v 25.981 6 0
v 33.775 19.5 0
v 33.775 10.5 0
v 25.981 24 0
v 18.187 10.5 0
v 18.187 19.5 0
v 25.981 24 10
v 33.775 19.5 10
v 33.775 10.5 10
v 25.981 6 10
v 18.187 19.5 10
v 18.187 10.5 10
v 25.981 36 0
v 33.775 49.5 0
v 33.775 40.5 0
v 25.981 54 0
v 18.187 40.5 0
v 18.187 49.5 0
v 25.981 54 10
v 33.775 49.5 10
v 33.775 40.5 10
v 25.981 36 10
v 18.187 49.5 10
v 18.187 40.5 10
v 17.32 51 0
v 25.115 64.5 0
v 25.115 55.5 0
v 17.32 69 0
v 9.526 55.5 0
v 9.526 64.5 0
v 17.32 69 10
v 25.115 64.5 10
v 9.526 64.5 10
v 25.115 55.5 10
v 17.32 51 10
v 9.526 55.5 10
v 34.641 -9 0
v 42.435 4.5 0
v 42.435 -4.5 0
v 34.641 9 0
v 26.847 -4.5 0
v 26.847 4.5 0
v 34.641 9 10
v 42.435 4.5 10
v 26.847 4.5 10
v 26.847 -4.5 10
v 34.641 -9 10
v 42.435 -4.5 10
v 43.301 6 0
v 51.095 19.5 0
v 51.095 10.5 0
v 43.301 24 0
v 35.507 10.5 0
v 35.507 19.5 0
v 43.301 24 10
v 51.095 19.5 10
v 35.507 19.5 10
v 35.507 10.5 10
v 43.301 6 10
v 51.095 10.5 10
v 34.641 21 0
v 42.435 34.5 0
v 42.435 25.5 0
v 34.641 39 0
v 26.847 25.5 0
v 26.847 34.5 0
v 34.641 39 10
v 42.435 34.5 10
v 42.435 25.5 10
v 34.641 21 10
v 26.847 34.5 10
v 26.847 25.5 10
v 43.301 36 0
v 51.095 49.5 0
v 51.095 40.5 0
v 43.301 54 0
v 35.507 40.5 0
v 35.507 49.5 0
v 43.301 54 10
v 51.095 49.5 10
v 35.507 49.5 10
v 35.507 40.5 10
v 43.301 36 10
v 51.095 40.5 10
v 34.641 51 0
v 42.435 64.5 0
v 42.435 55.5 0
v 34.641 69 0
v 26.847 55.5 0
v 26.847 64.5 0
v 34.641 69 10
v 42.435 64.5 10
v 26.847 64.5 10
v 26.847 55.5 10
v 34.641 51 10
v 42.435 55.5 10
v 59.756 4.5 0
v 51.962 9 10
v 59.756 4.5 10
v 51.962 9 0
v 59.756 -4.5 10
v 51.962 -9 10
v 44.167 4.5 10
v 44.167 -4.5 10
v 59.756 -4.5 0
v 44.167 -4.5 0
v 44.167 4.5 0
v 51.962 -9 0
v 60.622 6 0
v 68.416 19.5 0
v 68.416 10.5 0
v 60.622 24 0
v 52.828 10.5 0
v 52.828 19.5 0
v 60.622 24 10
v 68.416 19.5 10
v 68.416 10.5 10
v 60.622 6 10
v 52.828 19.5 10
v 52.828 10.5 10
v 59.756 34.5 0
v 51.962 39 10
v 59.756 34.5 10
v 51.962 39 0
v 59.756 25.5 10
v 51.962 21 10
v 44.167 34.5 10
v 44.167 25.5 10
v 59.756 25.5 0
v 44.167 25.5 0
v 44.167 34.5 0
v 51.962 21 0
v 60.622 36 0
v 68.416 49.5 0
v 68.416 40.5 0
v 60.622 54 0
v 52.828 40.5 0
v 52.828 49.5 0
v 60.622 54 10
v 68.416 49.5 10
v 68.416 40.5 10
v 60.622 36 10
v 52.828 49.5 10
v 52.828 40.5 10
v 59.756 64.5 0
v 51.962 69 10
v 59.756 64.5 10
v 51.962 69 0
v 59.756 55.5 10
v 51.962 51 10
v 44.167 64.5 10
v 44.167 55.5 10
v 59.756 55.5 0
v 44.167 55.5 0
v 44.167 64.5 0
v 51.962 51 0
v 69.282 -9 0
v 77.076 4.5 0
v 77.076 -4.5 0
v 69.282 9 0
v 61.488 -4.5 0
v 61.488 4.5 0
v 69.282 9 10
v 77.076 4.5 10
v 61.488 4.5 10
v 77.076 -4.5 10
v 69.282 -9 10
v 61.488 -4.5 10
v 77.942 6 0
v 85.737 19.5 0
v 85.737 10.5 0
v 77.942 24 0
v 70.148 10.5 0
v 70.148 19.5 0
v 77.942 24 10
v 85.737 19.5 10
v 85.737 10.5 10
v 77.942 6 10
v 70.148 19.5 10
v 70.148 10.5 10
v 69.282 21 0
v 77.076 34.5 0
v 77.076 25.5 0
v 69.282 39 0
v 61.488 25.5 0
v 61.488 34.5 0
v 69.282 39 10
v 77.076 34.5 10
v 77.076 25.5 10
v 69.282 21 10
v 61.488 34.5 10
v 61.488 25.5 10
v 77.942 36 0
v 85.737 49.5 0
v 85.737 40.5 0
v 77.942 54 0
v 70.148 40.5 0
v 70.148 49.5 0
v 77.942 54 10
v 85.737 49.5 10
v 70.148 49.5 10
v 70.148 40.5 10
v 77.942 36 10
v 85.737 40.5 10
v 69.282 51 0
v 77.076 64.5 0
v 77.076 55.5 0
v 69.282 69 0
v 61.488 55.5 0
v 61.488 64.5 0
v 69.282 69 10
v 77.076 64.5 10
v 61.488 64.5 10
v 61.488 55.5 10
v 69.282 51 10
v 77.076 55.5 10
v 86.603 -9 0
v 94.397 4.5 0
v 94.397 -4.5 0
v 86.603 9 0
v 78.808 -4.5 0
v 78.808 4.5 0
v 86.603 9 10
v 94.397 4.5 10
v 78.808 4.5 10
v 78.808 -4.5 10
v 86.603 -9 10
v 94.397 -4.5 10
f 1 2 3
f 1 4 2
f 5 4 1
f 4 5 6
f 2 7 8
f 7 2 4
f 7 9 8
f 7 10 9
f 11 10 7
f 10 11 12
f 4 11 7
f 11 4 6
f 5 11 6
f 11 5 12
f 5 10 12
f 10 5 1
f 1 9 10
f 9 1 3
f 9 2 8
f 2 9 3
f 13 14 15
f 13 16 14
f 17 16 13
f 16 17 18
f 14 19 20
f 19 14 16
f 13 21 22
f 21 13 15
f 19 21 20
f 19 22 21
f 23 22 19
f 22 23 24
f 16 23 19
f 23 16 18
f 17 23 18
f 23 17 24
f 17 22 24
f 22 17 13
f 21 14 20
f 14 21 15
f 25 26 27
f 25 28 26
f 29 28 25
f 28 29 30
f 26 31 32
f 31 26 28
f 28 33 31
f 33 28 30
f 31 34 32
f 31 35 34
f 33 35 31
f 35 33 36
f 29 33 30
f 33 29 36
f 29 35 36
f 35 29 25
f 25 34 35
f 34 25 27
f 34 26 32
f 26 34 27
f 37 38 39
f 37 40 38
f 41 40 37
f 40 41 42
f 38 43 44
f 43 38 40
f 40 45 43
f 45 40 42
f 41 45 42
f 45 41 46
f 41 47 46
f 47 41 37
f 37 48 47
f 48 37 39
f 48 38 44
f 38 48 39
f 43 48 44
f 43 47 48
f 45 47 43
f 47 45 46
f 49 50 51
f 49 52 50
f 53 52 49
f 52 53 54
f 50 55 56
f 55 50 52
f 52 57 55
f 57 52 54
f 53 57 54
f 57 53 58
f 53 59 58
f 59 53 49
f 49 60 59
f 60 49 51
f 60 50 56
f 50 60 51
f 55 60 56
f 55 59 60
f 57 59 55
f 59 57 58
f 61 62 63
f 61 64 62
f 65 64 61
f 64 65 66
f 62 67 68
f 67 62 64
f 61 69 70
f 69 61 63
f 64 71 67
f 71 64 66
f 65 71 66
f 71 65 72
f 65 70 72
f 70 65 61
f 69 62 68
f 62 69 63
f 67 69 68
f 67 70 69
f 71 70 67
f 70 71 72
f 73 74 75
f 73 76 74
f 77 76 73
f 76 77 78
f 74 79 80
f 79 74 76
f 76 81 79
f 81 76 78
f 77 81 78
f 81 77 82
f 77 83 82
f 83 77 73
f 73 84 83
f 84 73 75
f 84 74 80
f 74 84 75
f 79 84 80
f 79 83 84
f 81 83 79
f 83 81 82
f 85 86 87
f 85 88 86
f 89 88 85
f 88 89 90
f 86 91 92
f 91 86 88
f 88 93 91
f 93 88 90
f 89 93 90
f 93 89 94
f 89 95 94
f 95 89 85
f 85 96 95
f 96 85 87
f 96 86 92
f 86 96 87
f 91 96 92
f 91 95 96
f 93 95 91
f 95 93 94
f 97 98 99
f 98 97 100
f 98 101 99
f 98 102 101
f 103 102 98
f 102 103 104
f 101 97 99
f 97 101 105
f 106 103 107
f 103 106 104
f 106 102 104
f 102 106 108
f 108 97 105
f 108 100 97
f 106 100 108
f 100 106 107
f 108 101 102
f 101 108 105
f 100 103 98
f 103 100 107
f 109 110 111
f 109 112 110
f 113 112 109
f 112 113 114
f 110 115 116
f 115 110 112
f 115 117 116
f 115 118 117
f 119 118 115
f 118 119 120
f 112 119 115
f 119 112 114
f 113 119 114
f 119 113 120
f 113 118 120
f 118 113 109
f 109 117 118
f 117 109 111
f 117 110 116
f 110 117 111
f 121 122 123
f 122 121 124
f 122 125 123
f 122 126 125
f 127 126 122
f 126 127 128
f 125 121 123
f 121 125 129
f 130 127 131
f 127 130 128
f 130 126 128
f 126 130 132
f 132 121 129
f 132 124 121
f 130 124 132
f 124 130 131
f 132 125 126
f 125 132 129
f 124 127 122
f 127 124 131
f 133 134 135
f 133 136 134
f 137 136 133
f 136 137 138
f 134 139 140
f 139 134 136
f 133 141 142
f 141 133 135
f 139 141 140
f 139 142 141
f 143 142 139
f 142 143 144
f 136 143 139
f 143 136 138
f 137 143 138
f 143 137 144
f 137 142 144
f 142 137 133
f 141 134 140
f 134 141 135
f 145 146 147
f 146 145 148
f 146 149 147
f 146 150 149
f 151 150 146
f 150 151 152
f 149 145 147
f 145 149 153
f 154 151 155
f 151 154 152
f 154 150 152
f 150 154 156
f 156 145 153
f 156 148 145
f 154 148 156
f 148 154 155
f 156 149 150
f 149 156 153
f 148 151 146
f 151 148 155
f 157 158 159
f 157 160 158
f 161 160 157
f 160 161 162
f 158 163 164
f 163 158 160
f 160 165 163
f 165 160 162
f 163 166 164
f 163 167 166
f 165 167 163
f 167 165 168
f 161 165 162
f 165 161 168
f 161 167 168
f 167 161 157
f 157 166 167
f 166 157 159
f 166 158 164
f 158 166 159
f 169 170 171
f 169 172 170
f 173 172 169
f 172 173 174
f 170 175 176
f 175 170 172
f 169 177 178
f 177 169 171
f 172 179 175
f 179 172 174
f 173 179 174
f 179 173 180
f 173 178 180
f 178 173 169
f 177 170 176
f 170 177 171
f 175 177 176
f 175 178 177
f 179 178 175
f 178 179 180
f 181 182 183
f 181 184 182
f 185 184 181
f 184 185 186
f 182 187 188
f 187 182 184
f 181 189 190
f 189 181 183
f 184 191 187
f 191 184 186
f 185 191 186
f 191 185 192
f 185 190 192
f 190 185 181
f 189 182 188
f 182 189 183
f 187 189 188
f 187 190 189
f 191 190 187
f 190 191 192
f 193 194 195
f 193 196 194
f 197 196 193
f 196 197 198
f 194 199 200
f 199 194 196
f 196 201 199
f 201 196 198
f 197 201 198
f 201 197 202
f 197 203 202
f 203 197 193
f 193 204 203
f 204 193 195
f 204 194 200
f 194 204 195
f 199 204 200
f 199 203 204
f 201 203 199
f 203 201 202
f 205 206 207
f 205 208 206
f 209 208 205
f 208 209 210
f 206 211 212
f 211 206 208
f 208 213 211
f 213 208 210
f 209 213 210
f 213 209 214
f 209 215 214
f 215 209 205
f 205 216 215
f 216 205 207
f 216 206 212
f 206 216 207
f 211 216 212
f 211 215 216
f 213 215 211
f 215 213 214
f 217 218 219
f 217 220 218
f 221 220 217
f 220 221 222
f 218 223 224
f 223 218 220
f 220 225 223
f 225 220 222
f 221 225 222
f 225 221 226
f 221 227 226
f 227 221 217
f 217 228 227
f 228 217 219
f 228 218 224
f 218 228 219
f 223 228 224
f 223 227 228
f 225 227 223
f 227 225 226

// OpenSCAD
// file: ../../src/semi_regular/tess_4_8_8.scad
/*
    Tessella: Semi-Regular Tessellation - 4.8.8
    ===========================================
    This module implements the tessellation of a plane using a semi-regular tiling
    pattern defined by the vertex configuration 4.8.8, where one square and two
    octagons meet at each vertex.
*/

include <../tessUtils.scad>;

/**
 * @brief Generates center points for an octagonal grid.
 *
 * Creates a 2D grid of center points for octagons spaced by the octagon's side length.
 *
 * @param radius The radius of each octagon.
 * @param n The number of octagons along the x-axis.
 * @param m The number of octagons along the y-axis.
 * @param rotate (Optional) Boolean to apply rotation to the grid, default is true.
 * @return An array of center points for octagons.
 */
function octagons_centers_rect(
    radius,
    n,
    m
) =
    let (
        side_length = (radius * 2) / (sqrt(4 + 2 * sqrt(2))), // Side length of the octagon
        total_width = side_length * (1 + sqrt(2)) // Total width including spacing
    ) squares_centers_rect(total_width, n, m);

/**
 * @brief Generates center points for the squares in a 4.8.8 tiling grid.
 *
 * Aligns the square centers with the octagonal centers by using a shifted grid,
 * creating the required semi-regular tiling pattern.
 *
 * @param radius The radius of the octagons.
 * @param n The number of octagons along the x-axis.
 * @param m The number of octagons along the y-axis.
 * @return An array of center points for squares.
 */
function squares_8_8_centers_rect(radius, n, m) =
    let (
        side_length = (radius * 2) / (sqrt(4 + 2 * sqrt(2))), // Side length of the octagon
        total_width = side_length * (1 + sqrt(2)), // Total width including spacing
        shift_x = total_width / 2, // Horizontal shift for squares
        shift_y = total_width / 2 // Vertical shift for squares
    ) [for (c = squares_centers_rect(total_width, n - 1, m - 1)) [c[0] + shift_x, c[1] + shift_y]];

/**
 * @brief Generates vertices for octagons based on radius and center points.
 *
 * Generates the vertices for octagons based on the provided center points and radius.
 *
 * @param radius The radius of each octagon.
 * @param centers Array of center points.
 * @param angular_offset (Optional) Rotation angle for vertices, default is 22.5°.
 * @return Array of vertices for each octagon.
 */
function octagons_vertices(radius, centers, angular_offset = 22.5) =
    [
        for (center = centers) [
            for (i = [0:7]) let (
                angle = i * 45 + angular_offset
            ) [center[0] + radius * cos(angle), center[1] + radius * sin(angle)],
        ],
    ];
// file: ../../src/regular/triangles.scad
/*
    Tessella: Regular Tessellation - Triangles
    ==========================================
    This module implements the tessellation of a plane using regular triangles,
    where each tile is congruent, and all vertex angles around a point sum to 360°.

    Polygon properties:
    - Sides: 3
    - Interior Angle: 60°
    - Vertex Configuration: 3.3.3.3.3.3

    Mathematically valid because the interior angle divides 360° exactly.
    Reference: Euclidean tessellation theory for regular polygons.
*/

include <../tessUtils.scad>;

/**
 * @brief Generates center points for a "levels-based" triangle arrangement.
 *
 * Creates a roughly radial or diamond-like pattern of triangle centers. The center row
 * has (2*levels - 1) triangles, each additional row above/below decreases by 1 triangle.
 *
 * @param side   The side length of each equilateral triangle.
 * @param levels Number of levels away from the center row.
 * @return       An array of center points for triangles.
 */
function triangles_centers_radial(side, levels) =
    let (
        // Vertical height of each triangle
        vheight = side * sqrt(3) / 2,
        // Generate rows symmetrically around the center
        rows0 = [
            for (i = [-ceil(levels / 2 - 1):ceil(levels / 2 - 1)])
            let (
                rowCount = (levels - ( (levels + 1) % 2)) - abs(i), // Number of triangles in the row
                yOff = i * vheight, // Vertical offset for the row
                xStart = -(rowCount - 1) * side / 2 // Horizontal start to center the row
            ) [[xStart, yOff], rowCount],
        ],
        rows1 = (levels == 1) ? []
        : [
            for (i = [-(floor(levels / 2)):(floor(levels / 2 - 1))])
            let (
                rowCount = (levels - ( (levels) % 2)) - abs(i), // Number of triangles in the row
                yOff = i * vheight + vheight / 2 - (vheight - sqrt(3) / 3 * side) / 2, // Vertical offset for the row
                xStart = -(rowCount - 1) * side / 2 // Horizontal start to center the row
            ) [[xStart, yOff], rowCount],
        ],
        rows = concat(rows0, rows1)
    )
    // Generate center points for all rows
    [for (row = rows) for (j = [0:row[1] - 1]) [row[0][0] + j * side, row[0][1]]];

/**
 * @brief Generates center points for a rectangular grid of equilateral triangles (n x m).
 *
 * Alternating rows are horizontally offset by half a side for a typical triangular tiling pattern.
 *
 * @param side The side length of each triangle.
 * @param n    Number of triangles along x-axis.
 * @param m    Number of rows (y-axis).
 * @return     An array of center points for triangles.
 */
function triangles_centers_rect(side, n, m) =
    let (
        vheight = side * sqrt(3) / 2, // Vertical height of each triangle
        col_shift = side / 2, // Horizontal shift for each column
        row_shift = vheight, // Horizontal shift for alternating rows
        offset_shift = row_shift - (vheight - sqrt(3) / 3 * side) * 2
    ) [for (j = [0:m - 1], i = [0:n - 1]) [(i) * row_shift + (offset_shift * (j % 2)), j * col_shift]];

/**
 * @brief Generates vertices for equilateral triangles at specified centers.
 *
 * Rotates every other row by 180° and applies an additional angular offset for customization.
 *
 * @param side           The side length of each triangle.
 * @param centers        The array of center points for the triangles.
 * @param angular_offset An additional angular offset to apply to all triangles.
 * @param is_radial      If true, calculates the row index based on radial arrangement.
 * @return               A nested array of vertices for all triangles.
 */
function triangle_vertices(side, centers, angular_offset = 0, rect = true) =
    let (
        EPSILON = 1e-9, // Small value for floating-point comparison
        vheight = side * sqrt(3) / 2, // Vertical height of each triangle
        // This messy line pretty much determines if a row is odd or even based on the vertical position, it needs to check
        // using the reverse calculation of rows1 / offset shift, looking at that now it should probably be refactored.
        // Overall, this works and gets the geometrical idea across, but it's not the most readable (literally horrendous).
        row_parity = [
            for (c = centers) (
                (
                    ( ( ( (rect ? c[0] : c[1]) + EPSILON - vheight / 2 + (vheight - sqrt(3) / 3 * side) / 2) / vheight) % 1) <= EPSILON
                ) && (
                    (
                        ( ( (rect ? c[0] : c[1]) - EPSILON - vheight / 2 + (vheight - sqrt(3) / 3 * side) / 2) / vheight) % 1
                    ) >= -EPSILON
                ) ? 0
                : 1
            ),
        ], // Calculate row parity
        rotation_adjustment = [
            for (i = [0:len(centers) - 1]) (
                row_parity[i] ? (rect ? 0 : 180)
                : (rect ? 180 : 0)
            ),
        ] // Flip every other row
    ) [
            for (i = [0:len(centers) - 1]) [
                for (j = [0:2]) let (
                    angle = j * 120 + angular_offset + rotation_adjustment[i]
                ) [
                        centers[i][0] + side / sqrt(3) * cos(angle),
                        centers[i][1] + side / sqrt(3) * sin(angle),
                ],
            ],
    ];
// file: ../../src/regular/squares.scad
/*
    Tessella: Regular Tessellation - Squares
    ========================================
    This module implements the tessellation of a plane using regular squares,
    where each tile is congruent, and all vertex angles around a point sum to 360°.

    Polygon properties:
    - Sides: 4
    - Interior Angle: 90°
    - Vertex Configuration: 4.4.4.4
*/

include <../tessUtils.scad>;

/**
 * @brief Generates center points for a "levels-based" square arrangement.
 *
 * Creates a diamond-like pattern of square centers. The center (middle) row has (2*levels - 1) squares.
 * Each additional row above or below the center has one fewer square, until only 1 square remains at the
 * top and bottom (when levels > 1).
 *
 * @param side   The side length of each square.
 * @param levels Number of levels (rows above the center, plus the center, plus rows below).
 * @return       An array of center points for squares.
 */
function squares_centers_radial(side, levels) =
    let (
        // Offsets for spacing
        offset_x = side, // Horizontal spacing
        offset_y = side, // Vertical spacing

        // Generate rows from the center outward
        // Row i = -(levels-1) to +(levels-1), where i=0 is the center row.
        rows = [
            for (i = [-(levels - 1):(levels - 1)])
            let (
                rowCount = (2 * levels - 1) - abs(i), // Number of squares in the row
                yOff = i * offset_y, // Vertical position of the row
                xStart = -(rowCount - 1) * offset_x / 2 // Horizontal start to center the row
            ) [[xStart, yOff], rowCount],
        ]
    )
    // For each row definition, generate square center points
    [for (row = rows) for (j = [0:row[1] - 1]) [row[0][0] + j * offset_x, row[0][1]]];

/**
 * @brief Generates center points for a rectangular grid of squares (n x m).
 *
 * Produces a 2D grid of center points spaced by side length in both x and y directions.
 *
 * @param side The side length of each square.
 * @param n    The number of squares along the x-axis.
 * @param m    The number of squares along the y-axis.
 * @return     An array of center points for squares.
 */
function squares_centers_rect(side, n, m) =
    let (offset_x = side, offset_y = side) [for (ix = [0:n - 1], iy = [0:m - 1]) [ix * offset_x, iy * offset_y]];

/**
 * @brief Renders 2D squares at specified centers, with optional color gradient.
 *
 * @param side          The side length of each square.
 * @param spacing       (Optional) Spacing between squares, default is 0.
 * @param centers       (Optional) Array of center points. If empty, `levels` or (n,m) must be provided.
 * @param levels        (Optional) Number of levels for diamond-like pattern generation.
 * @param n, m          (Optional) Grid dimensions if using NxM generation.
 * @param color_scheme  (Optional) Name of the color scheme for gradient.
 * @param alpha         (Optional) Alpha transparency value.
 */

function squares_vertices(side, centers, angular_offset = 45) =
    [
        for (
            center = centers
        ) [
            for (i = [0:3]) let (angle = i * 90 + angular_offset) [
                    center[0] + side / sqrt(2) * cos(angle),
                    center[1] + side / sqrt(2) * sin(angle),
            ],
        ],
    ];
// file: ../../src/regular/hexagons.scad
/*
    Tessella: Regular Tessellation - Hexagons
    =========================================
    Tessellates a plane using regular hexagons.
    Properties:
    - Sides: 6
    - Interior Angle: 120°
    - Vertex Configuration: 6.6.6
*/

include <../tessUtils.scad>;

/**
 * Generates center points for a hexagonal tessellation in a radial pattern.
 * @param radius The radius of each hexagon.
 * @param levels Number of radial levels.
 * @return Array of hexagon center points.
 */
function hexagons_centers_radial(radius, levels) =
    let (
        offset_x = radius * cos(30),
        offset_y = radius + radius * sin(30),
        offset_step = 2 * offset_x,
        dx = -(levels - 1) * offset_x * 2,
        beginning_n = 2 * levels - 1,
        hexagons_pts = function(hex_datum)
        let (
            tx = hex_datum[0][0] + dx,
            ty = hex_datum[0][1],
            n_pts = hex_datum[1],
            offset_xs = [for (i = [0:n_pts - 1]) i * offset_step]
        ) [for (x = offset_xs) [x + tx, ty]],
        upper_hex_data = levels > 1 ? [
                for (i = [1:beginning_n - levels]) let (
                    x = offset_x * i,
                    y = offset_y * i,
                    n_upper = beginning_n - i
                ) [[x, y], n_upper],
            ]
        : [],
        lower_hex_data = levels > 1 ? [for (hex_datum = upper_hex_data) [[hex_datum[0][0], -hex_datum[0][1]], hex_datum[1]]]
        : [],
        total_hex_data = [[[0, 0], beginning_n], each upper_hex_data, each lower_hex_data],
        centers = [for (hex_datum = total_hex_data) hexagons_pts(hex_datum)]
    ) concat([for (c = centers) each c]);

/**
 * Generates center points for a rectangular hexagonal grid.
 * @param radius The radius of each hexagon.
 * @param n Number of hexagons along x-axis.
 * @param m Number of hexagons along y-axis.
 * @return Array of hexagon center points.
 */
function hexagons_centers_rect(radius, n, m) =
    let (
        offset_x = radius * cos(30),
        offset_y = radius + radius * sin(30),
        offset_step = 2 * offset_x
    ) [for (i = [0:n - 1], j = [0:m - 1]) [i * offset_step + (j % 2) * (offset_step / 2), j * offset_y]];

/**
 * Generates vertices for hexagons based on radius and center points.
 * @param radius The radius of each hexagon.
 * @param centers Array of center points.
 * @param angular_offset Rotation angle for vertices.
 * @return Array of vertices for each hexagon.
 */
function hexagons_vertices(radius, centers, angular_offset = 30) =
    [
        for (center = centers) [
            for (i = [0:5]) let (
                angle = i * 60 + angular_offset
            ) [center[0] + radius * cos(angle), center[1] + radius * sin(angle)],
        ],
    ];
// file: ../../src/tessUtils.scad
EPSILON = 1e-3; ///< Tolerance value used for floating-point comparisons.

/**
 * @brief Generates a gradient color based on normalized coordinates and a color scheme.
 *
 * Selects a color by mapping normalized x and y coordinates to RGB values according to the specified color scheme.
 *
 * @param normalized_x The normalized x-coordinate (0 to 1).
 * @param normalized_y The normalized y-coordinate (0 to 1).
 * @param color_scheme The name of the color scheme to use.
 * @return An RGB color array [r, g, b].
 */
function get_gradient_color(normalized_x, normalized_y, color_scheme) =
    color_scheme == "scheme1" ? [normalized_x, 1 - normalized_x, normalized_y]
    : // Red to Blue
    color_scheme == "scheme2" ? [1 - normalized_y, normalized_x, normalized_y]
    : // Green to Magenta
    color_scheme == "scheme3" ? [normalized_y, 1 - normalized_y, normalized_x]
    : // Blue to Yellow
    color_scheme == "scheme4" ? [1 - normalized_x, normalized_x, 1 - normalized_y]
    : // Cyan to Red
    color_scheme == "scheme5" ? [normalized_x, normalized_x * normalized_y, 1 - normalized_x]
    : // Purple to Green
    color_scheme == "scheme6" ? [1 - normalized_x * normalized_y, normalized_y, normalized_x]
    : // Orange to Blue
    [0.9, 0.9, 0.9]; // Default color (grey) if no valid color scheme is provided

/**
 * @brief Renders points as text labels and optional spheres in the 3D space.
 *
 * Displays each point's coordinates as text at its location and optionally places a sphere at the point.
 *
 * @param points An array of points to display, each as [x, y].
 * @param text_size (Optional) Size of the text labels; default is 1.
 * @param color (Optional) Color of the text labels; default is [0.1, 0.1, 0.1].
 * @param pointD (Optional) Diameter of the sphere to place at each point; if undef, no sphere is placed.
 * @param point_color (Optional) Color of the spheres; default is [0.1, 0.1, 0.1].
 * @param fn (Optional) Number of facets for the spheres; default is 8.
 */
module print_points(
    points,
    text_size = 1,
    color = [0.1, 0.1, 0.1],
    pointD = undef,
    point_color = [0.1, 0.1, 0.1],
    fn = 8
) {
    for (point = points) {
        // Translate +1 in Z-axis to avoid z-fighting with the surface
        translate([point[0], point[1] + pointD * 2, pointD * 2]) color(color)
                text(str("[", point[0], ", ", point[1], "]"), size=text_size, valign="center", halign="center");
        if (pointD != undef) {
            // Place a sphere at the point if pointD is specified
            color(point_color) translate([point[0], point[1], 0]) sphere(pointD, $fn=fn);
        }
    }
}

/**
 * @brief Checks if two points are equal within a specified tolerance.
 *
 * @param p1 First point as [x, y].
 * @param p2 Second point as [x, y].
 * @param tolerance (Optional) Tolerance value for comparison; default is EPSILON.
 * @return True if points are equal within tolerance, false otherwise.
 */
function points_equal(p1, p2, tolerance = EPSILON) =
    let (
        comparisons = [
            for (i = [0:len(p1) - 1]) abs(p1[i] - p2[i]) < tolerance,
        ]
    )
    // Check if all comparisons are true
    len([for (comp = comparisons) if (comp) true]) == len(comparisons);

/**
 * @brief Checks if a point exists within a list of points, within a specified tolerance.
 *
 * @param point The point to check, as [x, y].
 * @param list The list of points to search within.
 * @param tolerance (Optional) Tolerance value for comparison; default is EPSILON.
 * @return True if the point exists in the list within tolerance, false otherwise.
 */
function is_point_in_list(
    point,
    list,
    tolerance = EPSILON
) =
    let (equal_points = [for (p = list) points_equal(p, point, tolerance)]) len([for (eq = equal_points) if (eq) true]) > 0;

/**
 * @brief Filters out centers that are present in a filter list.
 *
 * Removes centers from the provided list that match any in the filter_list, within a specified tolerance.
 *
 * @param centers An array of centers to be filtered.
 * @param filter_list An array of centers to filter out.
 * @param tolerance (Optional) Tolerance value for comparison; default is EPSILON.
 * @return A filtered array of centers.
 */
function filter_center_points(centers, filter_list, tolerance = EPSILON) =
    [for (center = centers) if (!is_point_in_list(center, filter_list, tolerance)) center];

/** 
 * @brief Renders a generic polygon shape with optional extrusion and color gradient.
 *
 * This module allows rendering of polygons defined by vertices and paths, with optional extrusion for 3D effects.
 * It supports color gradients based on center points and a specified color scheme.
 *
 * @param vertices An array of vertices for the polygon.    
 * @param paths An array of paths defining the polygon.
 * @param centers (Optional) An array of center points for each polygon, used for color gradient.
 * @param color_scheme (Optional) A string defining the color scheme for the gradient.
 * @param alpha (Optional) Transparency level for the color; default is 1 (opaque).
 * @param extrude (Optional) Height for linear extrusion; if undef, no extrusion is applied.
 * @return Renders the polygon with the specified properties.
 */

module generic_poly(vertices, paths, centers = undef, color_scheme = undef, alpha = 1, extrude = undef) {
    if (!is_undef(color_scheme) && !is_undef(centers)) {
        // Compute normalization bounds
        min_x = min([for (center = centers) center[0]]);
        max_x = max([for (center = centers) center[0]]);
        min_y = min([for (center = centers) center[1]]);
        max_y = max([for (center = centers) center[1]]);

        for (i = [0:len(vertices) - 1]) {
            // Normalize coordinates for color gradient
            normalized_x = (centers[i][0] - min_x) / (max_x - min_x + 1e-9);
            normalized_y = (centers[i][1] - min_y) / (max_y - min_y + 1e-9);

            // Get color value
            color_val = get_gradient_color(normalized_x, normalized_y, color_scheme);

            // Render the shape
            color(color_val, alpha=alpha) if (!is_undef(extrude))
                linear_extrude(height=extrude)
                    polygon(points=vertices[i], paths=paths);
            else
                polygon(points=vertices[i], paths=paths);
        }
    } else {
        for (i = [0:len(vertices) - 1]) {
            // Render the shape without a color gradient
            if (!is_undef(extrude))
                linear_extrude(height=extrude) polygon(points=vertices[i], paths=paths);
            else
                polygon(points=vertices[i], paths=paths);
        }
    }
}
// file: ../../tess.scad
/**
 * @file tess.scad
 * @brief Functions and modules for generating tessellation patterns and rendering shapes.
 * @author Cameron K. Brooks
 * @copyright 2024
 * @info This file serves as an index file to allow for blind importing of all tessellation modules.
 *
 */

// Import utility modules
include <src/tessUtils.scad>

// Import regular tessellation modules

include <src/regular/hexagons.scad>; // Contains hexagon tessellation functions & assets
include <src/regular/squares.scad>; // Contains square tessellation functions & assets
include <src/regular/triangles.scad>; // Contains triangle tessellation functions & assets

// Import semi-regular (Archimedean) tessellation modules
include <src/semi_regular/tess_4_8_8.scad>; // Contains 4.8.8 tessellation functions & octagon assets
// main file
// Rectangular hexagons
// Five rows of six hexagons, with tiles removed from the left and right edges to change the outline.

use <../../tess.scad>

n = 6;          // Number of hexagons along x-axis in the rectangular tessellation
m = 5;          // Number of hexagons along y-axis in the rectangular tessellation
rad = 10;       // Radius of hexagons
space = 1;      // Spacing between hexagons
extHeight = 10; // Extrusion height for hexagons
filter = true;  // Enable or disable filtering

// Generate unfiltered center points
unfiltered_centers = hexagons_centers_rect(radius = rad, n = n, m = m);
echo("Unfiltered Centers Grid:", unfiltered_centers);

// Use the echo output to define the desired filter points
filter_points = [
    [ 0, 0 ], [ 17.3205, 0 ], [ 8.66025, 15 ], [ 17.3205, 30 ], [ 0, 30 ], [ 8.66025, 45 ], [ 0, 60 ], [ 95.2628, 15 ],
    [ 86.6025, 30 ], [ 95.2628, 45 ], [ 86.6025, 60 ]
];

// Filter the center points if filtering is enabled
filtered_centers = filter_center_points(unfiltered_centers, filter_points);
echo("Filtered Centers Grid:", filtered_centers);

// Use the filtered centers if filtering is enabled
centers = filter ? filtered_centers : centers;

// Generate vertices for the hexagons
vertices = hexagons_vertices(radius = rad - space, centers = filtered_centers, angular_offset = 30);

// Render the hexagons using the generic_poly module
generic_poly(vertices = vertices,               // The vertices defining the hexagons
             paths = [[ 0, 1, 2, 3, 4, 5, 0 ]], // Hexagon paths defining the connection order of vertices
             centers = centers,                 // Centers used for optional color scheme calculations
             color_scheme = "scheme3",          // Apply a color gradient based on centers
             alpha = 0.5,                       // Set the transparency level
             extrude = 10                       // Extrusion height for 3D rendering
);
// Note:
// - The 'centers' parameter is used only for calculating the color scheme.
//   If no color scheme is needed, this parameter can be omitted.
// - The 'vertices' parameter is mandatory for defining the geometry of the tessellation.
// - The 'paths' parameter defines the connectivity of vertices to form each shape.
//   For example, [[0, 1, 2, 3, 4, 5, 0]] represents a hexagon connecting vertices in order.
// - If only a flat visualization of the tessellation is required, the 'extrude' parameter can be omitted.
//   For example:
//   generic_poly(vertices = vertices, paths = [[0, 1, 2, 3, 4, 5, 0]]);

// Render points for debugging and visualization of the center points and their filtering
translate([ 0, 0, extHeight ])
    print_points(filtered_centers, text_size = 1, color = "Black", pointD = 0.5, point_color = "Red", fn = 12);
